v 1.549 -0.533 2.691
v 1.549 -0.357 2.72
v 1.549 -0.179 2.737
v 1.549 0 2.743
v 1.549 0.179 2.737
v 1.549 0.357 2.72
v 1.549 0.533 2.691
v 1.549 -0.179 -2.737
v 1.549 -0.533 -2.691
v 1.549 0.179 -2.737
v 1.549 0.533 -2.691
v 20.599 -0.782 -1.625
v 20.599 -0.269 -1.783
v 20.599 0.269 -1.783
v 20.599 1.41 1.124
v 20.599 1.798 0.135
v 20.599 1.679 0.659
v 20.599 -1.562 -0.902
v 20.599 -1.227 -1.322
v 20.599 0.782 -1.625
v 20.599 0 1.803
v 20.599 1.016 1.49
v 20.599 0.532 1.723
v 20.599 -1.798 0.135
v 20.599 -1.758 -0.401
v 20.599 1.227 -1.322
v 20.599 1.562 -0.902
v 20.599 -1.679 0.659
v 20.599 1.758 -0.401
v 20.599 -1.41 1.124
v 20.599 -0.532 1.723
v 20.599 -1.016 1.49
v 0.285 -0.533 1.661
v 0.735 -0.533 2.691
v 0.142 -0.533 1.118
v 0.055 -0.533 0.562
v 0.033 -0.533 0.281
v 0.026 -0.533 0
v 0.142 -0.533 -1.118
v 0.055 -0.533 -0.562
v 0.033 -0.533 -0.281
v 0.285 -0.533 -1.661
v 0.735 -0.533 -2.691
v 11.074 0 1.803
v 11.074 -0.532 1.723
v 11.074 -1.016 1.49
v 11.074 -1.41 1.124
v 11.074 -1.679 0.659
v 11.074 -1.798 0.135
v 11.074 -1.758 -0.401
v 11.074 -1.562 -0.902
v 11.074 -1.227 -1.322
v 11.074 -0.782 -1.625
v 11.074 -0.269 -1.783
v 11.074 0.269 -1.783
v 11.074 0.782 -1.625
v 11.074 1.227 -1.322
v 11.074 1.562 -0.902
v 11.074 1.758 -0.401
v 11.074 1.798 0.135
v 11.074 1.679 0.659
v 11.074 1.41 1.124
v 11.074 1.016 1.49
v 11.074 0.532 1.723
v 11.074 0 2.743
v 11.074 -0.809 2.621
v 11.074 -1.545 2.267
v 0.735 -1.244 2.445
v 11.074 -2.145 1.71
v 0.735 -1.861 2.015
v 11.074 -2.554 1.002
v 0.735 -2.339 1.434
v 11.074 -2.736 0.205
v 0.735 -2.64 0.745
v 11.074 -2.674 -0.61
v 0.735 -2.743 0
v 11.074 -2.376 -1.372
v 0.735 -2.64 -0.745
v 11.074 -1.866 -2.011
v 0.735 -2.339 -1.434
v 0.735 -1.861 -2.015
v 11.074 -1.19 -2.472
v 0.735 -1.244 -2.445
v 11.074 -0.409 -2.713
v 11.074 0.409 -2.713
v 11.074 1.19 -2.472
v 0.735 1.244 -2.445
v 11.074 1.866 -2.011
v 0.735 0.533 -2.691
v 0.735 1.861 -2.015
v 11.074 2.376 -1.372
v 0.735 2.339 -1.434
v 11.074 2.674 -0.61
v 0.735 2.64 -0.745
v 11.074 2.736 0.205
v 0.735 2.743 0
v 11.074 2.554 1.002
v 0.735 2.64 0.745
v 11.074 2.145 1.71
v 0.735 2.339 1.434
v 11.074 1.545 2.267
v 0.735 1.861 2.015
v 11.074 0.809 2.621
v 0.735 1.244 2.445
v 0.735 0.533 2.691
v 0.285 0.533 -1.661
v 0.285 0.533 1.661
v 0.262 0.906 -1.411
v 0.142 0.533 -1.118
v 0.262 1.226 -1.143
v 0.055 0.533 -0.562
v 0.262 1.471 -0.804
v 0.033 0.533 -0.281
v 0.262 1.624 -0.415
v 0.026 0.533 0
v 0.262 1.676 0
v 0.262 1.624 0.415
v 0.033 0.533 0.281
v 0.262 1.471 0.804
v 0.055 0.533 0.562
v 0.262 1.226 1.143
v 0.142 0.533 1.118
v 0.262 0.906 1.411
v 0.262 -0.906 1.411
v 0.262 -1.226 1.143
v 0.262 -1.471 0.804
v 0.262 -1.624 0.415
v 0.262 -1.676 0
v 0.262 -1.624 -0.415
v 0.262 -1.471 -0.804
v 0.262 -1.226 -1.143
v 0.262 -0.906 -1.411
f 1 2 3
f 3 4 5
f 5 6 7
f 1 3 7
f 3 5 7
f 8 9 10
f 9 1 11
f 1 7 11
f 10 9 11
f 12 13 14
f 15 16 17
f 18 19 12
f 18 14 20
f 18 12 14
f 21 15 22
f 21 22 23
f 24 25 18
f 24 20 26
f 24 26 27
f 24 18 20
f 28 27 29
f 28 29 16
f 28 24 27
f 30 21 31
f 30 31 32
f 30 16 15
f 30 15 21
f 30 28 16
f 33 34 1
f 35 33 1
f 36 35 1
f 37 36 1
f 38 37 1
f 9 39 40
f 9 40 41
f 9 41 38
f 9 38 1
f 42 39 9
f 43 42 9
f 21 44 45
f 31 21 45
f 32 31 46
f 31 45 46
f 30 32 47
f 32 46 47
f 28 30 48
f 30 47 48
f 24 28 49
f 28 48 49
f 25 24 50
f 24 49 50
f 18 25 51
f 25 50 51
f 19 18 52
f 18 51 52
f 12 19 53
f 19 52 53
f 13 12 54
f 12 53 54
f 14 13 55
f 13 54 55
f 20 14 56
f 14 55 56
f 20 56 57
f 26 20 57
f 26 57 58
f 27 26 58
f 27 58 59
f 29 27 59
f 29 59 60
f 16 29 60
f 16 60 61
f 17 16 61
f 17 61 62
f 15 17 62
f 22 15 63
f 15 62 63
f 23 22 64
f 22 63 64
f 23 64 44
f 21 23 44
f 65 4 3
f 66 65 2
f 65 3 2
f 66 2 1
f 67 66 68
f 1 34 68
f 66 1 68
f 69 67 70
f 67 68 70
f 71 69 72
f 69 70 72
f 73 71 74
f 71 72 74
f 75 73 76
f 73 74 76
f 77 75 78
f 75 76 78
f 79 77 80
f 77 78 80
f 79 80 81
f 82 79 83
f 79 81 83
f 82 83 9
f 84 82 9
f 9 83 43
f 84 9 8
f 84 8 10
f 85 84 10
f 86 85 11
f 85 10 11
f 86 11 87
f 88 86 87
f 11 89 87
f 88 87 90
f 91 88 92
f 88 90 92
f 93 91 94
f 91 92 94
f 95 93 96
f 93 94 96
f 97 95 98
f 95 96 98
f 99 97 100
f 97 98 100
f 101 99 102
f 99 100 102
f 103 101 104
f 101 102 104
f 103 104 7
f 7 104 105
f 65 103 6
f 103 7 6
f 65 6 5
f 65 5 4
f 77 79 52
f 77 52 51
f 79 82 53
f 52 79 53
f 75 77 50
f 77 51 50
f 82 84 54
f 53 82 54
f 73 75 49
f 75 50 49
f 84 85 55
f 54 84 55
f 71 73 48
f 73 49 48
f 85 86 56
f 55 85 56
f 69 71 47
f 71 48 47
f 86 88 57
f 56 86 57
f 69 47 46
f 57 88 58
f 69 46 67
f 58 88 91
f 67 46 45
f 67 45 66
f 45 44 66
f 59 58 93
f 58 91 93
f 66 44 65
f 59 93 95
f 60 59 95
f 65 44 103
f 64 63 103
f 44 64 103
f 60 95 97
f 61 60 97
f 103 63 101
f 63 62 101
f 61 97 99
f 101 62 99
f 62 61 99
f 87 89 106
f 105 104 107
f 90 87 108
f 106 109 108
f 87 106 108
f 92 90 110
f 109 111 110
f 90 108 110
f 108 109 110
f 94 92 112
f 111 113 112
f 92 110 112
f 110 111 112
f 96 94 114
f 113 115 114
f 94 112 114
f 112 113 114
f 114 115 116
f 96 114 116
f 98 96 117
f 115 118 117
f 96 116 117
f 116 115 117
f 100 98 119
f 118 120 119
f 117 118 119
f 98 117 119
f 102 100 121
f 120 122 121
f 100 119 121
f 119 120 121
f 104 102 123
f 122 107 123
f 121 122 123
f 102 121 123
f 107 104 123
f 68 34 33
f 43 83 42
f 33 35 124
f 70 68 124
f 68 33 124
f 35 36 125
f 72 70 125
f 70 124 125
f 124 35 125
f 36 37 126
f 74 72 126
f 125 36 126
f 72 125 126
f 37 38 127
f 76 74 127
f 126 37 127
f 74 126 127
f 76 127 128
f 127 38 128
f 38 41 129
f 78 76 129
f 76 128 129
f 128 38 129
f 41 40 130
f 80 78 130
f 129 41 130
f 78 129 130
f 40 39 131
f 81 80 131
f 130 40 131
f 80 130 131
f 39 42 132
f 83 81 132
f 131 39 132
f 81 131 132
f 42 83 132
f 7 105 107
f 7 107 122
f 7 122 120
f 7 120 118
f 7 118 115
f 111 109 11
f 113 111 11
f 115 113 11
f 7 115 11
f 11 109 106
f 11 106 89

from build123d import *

# Parameters (mm, degrees)
SKETCH2_W               = 5.4864
SKETCH2_H               = 1.0668
SLOT_DEPTH              = 1.5494
CROQUIS1_R              = 3.23116627
CORTAR_EXTRUIR1_DEPTH   = 12.709724159
CROQUIS4_R              = 1.8034
SALIENTE_EXTRUIR1_DEPTH = 9.525


with BuildPart() as part:
    # BodySke → BaseBody (revolve)
    with BuildSketch(Plane.XY, mode=Mode.PRIVATE) as basebody_sk:
        with BuildLine():
            Line((14.351, 0), (14.351, 1.4605))
            Line((14.351, 1.4605), (13.0683, 2.7432))
            Line((13.0683, 2.7432), (0.735038225, 2.7432))
            ThreePointArc((0.735038225, 2.7432), (0.186944547, 1.419984809), (0, 0))
            Line((0, 0), (14.351, 0))
        make_face()
    revolve(basebody_sk.sketch.rotate(Axis((-12.7, 0, 0), (1, 0, 0)), 90), axis=Axis((-12.7, 0, 0), (1, 0, 0)))

    # Sketch2 → Slot (cut)
    with BuildSketch(Plane(origin=(0, 0, 0), x_dir=(0, 0, -1), z_dir=(1, 0, 0))):
        Rectangle(SKETCH2_W, SKETCH2_H)
    extrude(amount=SLOT_DEPTH, mode=Mode.SUBTRACT)

    # Croquis1 → Cortar-Extruir1 (cut, through all)
    with BuildSketch(Plane.ZY.offset(-11.0744)):
        Circle(CROQUIS1_R)
    extrude(amount=-CORTAR_EXTRUIR1_DEPTH, mode=Mode.SUBTRACT)

    # Croquis4 → Saliente-Extruir1 (add)
    with BuildSketch(Plane(origin=(11.0744, 0, 0), x_dir=(0, 0, -1), z_dir=(1, 0, 0))):
        with Locations(Location((0, 0, 0), (0, 0, 180))):
            Circle(CROQUIS4_R)
    extrude(amount=SALIENTE_EXTRUIR1_DEPTH)


solid = part.part
